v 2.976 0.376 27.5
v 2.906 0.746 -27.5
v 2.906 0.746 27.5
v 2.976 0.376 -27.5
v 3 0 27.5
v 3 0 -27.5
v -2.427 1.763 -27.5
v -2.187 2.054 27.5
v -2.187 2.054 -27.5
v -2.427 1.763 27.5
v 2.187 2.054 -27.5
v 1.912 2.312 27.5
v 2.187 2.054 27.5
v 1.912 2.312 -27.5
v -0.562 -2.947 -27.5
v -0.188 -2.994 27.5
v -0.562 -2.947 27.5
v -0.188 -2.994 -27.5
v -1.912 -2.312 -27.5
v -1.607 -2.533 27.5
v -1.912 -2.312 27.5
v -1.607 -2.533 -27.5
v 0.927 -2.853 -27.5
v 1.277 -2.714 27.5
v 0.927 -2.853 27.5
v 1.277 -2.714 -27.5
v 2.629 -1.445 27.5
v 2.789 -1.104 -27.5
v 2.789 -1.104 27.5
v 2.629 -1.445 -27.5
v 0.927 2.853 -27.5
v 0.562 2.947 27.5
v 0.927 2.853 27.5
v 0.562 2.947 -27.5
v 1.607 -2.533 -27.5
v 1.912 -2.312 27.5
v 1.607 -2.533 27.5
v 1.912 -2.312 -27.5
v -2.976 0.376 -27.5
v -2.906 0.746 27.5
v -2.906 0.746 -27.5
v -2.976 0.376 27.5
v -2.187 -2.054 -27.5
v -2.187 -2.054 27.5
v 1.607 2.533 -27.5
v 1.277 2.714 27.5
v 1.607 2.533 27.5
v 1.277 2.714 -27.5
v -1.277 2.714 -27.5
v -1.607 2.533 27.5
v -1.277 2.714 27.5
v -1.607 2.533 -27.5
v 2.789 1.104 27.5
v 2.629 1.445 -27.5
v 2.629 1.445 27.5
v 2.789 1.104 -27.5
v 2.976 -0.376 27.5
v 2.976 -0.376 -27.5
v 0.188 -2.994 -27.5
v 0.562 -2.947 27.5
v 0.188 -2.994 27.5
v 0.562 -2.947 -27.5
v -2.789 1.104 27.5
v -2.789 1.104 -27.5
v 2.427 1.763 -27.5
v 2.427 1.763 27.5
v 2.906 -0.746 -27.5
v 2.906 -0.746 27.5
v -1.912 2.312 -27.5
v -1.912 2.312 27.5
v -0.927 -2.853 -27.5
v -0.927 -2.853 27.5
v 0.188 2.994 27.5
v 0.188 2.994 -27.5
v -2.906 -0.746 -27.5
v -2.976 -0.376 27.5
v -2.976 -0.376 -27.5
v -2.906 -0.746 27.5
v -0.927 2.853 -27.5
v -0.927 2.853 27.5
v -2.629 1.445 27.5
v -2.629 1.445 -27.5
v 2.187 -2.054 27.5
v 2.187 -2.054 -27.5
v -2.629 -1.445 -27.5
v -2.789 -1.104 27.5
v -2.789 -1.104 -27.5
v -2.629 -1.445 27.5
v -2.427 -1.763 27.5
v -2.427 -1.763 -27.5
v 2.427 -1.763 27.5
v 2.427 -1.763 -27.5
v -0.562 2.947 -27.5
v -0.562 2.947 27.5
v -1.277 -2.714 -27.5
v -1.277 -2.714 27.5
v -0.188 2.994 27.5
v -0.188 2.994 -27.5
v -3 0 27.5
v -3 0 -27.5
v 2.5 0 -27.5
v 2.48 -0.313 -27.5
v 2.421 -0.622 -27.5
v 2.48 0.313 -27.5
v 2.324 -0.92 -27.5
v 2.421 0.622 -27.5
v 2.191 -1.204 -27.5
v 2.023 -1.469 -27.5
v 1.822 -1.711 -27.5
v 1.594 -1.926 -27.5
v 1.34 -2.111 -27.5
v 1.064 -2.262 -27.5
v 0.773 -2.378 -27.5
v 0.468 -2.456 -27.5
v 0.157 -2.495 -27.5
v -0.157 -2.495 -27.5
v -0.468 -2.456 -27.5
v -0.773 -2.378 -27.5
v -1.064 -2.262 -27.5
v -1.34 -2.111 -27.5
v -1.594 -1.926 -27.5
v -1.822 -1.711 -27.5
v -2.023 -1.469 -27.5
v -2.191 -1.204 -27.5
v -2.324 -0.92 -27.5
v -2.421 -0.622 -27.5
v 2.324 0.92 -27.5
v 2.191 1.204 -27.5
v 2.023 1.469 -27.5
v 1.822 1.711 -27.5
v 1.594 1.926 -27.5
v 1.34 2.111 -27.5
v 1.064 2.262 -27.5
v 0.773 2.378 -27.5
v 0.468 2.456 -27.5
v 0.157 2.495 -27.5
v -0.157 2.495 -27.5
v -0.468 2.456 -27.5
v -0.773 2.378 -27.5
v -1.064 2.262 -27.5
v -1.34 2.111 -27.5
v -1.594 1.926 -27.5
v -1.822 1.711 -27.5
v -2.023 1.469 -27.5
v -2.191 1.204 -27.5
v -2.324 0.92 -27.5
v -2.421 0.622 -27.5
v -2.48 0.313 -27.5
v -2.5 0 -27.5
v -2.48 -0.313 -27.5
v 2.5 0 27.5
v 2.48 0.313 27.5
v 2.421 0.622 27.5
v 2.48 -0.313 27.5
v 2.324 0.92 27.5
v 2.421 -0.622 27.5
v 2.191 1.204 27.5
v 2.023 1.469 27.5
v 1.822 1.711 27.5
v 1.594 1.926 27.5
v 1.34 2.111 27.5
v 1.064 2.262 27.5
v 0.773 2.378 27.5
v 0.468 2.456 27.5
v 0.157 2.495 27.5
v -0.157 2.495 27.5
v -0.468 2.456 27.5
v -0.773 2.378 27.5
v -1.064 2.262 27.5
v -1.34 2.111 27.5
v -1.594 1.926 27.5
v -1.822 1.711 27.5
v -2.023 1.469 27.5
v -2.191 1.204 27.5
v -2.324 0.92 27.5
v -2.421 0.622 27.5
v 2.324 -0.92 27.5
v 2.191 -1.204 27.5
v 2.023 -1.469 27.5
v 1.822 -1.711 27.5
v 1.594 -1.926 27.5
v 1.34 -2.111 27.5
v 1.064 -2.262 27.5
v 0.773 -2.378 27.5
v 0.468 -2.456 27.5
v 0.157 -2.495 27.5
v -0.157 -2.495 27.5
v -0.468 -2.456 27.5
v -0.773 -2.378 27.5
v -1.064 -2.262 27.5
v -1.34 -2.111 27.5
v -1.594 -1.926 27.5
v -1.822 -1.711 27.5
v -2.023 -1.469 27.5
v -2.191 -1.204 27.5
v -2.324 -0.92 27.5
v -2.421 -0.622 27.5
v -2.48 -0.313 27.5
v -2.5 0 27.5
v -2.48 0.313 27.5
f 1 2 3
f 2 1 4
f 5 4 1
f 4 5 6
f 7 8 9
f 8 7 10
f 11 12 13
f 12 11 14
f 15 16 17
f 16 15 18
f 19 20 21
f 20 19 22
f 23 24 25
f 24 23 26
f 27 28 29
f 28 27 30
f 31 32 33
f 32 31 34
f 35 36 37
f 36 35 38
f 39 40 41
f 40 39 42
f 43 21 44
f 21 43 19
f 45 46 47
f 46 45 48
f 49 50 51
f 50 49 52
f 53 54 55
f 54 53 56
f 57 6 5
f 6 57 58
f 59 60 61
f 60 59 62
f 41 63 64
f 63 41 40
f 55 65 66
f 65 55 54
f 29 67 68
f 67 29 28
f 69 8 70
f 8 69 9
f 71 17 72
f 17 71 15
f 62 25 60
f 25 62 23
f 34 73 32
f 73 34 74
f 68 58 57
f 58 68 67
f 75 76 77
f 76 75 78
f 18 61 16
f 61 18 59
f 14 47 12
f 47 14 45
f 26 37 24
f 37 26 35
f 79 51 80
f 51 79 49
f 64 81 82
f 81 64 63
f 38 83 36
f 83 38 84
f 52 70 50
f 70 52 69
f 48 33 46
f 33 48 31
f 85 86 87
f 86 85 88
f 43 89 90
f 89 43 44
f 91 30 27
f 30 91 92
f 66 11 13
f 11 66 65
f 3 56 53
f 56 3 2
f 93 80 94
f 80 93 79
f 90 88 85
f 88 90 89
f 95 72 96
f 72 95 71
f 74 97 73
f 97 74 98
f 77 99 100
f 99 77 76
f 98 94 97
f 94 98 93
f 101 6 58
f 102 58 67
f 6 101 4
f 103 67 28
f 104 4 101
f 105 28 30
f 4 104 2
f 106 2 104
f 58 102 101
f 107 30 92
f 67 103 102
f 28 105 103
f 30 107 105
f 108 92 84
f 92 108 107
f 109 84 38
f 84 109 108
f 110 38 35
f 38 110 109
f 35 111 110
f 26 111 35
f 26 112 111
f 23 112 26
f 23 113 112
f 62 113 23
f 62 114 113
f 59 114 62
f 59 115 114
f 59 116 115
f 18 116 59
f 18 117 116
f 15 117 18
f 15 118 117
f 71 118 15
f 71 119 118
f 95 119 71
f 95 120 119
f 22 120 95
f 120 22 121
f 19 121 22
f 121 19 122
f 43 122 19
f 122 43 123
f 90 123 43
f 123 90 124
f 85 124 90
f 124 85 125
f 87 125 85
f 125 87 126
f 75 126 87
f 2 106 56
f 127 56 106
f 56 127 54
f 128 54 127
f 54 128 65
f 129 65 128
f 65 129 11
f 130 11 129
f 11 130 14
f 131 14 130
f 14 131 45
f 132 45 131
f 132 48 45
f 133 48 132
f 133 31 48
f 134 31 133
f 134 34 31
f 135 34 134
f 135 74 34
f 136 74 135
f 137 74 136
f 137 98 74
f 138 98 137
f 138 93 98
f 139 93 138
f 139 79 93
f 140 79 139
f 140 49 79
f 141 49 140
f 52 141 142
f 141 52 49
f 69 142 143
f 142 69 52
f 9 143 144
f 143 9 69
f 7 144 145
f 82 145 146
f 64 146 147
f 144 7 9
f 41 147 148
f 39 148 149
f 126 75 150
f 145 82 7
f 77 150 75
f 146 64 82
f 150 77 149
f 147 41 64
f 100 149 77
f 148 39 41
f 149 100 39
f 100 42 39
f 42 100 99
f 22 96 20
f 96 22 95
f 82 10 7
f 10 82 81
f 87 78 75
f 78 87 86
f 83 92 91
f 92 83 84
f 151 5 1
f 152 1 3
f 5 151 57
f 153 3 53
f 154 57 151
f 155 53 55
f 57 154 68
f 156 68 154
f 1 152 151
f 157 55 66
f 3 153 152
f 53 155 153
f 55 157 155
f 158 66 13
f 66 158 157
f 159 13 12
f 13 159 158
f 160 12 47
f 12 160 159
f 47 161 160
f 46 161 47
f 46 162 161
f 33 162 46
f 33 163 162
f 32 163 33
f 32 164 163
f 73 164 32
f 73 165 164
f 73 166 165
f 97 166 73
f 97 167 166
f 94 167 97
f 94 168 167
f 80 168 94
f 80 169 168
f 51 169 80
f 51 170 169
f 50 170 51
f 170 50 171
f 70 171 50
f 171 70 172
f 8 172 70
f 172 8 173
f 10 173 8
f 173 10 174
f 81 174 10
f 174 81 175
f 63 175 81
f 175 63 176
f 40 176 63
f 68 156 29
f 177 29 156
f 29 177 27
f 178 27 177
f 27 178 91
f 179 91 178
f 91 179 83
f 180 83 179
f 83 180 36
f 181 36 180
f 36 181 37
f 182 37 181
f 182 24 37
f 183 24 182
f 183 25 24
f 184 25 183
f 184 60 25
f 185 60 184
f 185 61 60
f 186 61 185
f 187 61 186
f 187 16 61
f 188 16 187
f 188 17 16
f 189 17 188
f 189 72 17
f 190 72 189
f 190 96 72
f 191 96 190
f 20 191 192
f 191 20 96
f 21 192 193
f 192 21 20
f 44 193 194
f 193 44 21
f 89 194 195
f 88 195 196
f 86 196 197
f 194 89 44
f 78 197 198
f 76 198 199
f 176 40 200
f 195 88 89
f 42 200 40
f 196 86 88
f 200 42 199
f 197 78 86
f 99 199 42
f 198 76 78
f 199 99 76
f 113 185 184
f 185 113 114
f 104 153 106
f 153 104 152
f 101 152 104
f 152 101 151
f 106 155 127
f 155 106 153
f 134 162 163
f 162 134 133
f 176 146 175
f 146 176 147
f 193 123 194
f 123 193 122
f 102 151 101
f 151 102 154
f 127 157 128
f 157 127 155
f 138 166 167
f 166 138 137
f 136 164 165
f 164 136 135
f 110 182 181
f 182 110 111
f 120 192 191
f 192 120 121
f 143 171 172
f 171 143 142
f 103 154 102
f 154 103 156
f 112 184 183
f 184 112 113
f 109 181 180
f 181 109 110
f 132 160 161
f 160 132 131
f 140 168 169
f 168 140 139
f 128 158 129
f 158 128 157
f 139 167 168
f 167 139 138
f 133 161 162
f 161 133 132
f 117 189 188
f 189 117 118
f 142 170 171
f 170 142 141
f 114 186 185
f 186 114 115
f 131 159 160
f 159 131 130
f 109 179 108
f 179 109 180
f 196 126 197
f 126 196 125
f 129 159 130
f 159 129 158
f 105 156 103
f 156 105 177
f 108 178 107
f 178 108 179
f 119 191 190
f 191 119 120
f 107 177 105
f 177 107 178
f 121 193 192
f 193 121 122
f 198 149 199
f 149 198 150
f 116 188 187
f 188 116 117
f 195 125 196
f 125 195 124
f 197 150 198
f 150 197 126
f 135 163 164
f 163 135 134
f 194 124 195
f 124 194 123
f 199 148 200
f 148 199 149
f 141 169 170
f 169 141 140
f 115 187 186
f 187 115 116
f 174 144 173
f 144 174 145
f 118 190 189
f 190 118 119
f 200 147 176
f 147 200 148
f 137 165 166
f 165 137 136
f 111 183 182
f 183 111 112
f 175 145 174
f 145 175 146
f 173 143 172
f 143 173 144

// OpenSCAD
$fn = 50;


difference() {
	union() {
		translate(v = [0, 0, -27.5000000000]) {
			cylinder(h = 55, r = 3.0000000000);
		}
	}
	union() {
		translate(v = [0, 0, -100.0000000000]) {
			cylinder(h = 200, r = 2.5000000000);
		}
	}
}
